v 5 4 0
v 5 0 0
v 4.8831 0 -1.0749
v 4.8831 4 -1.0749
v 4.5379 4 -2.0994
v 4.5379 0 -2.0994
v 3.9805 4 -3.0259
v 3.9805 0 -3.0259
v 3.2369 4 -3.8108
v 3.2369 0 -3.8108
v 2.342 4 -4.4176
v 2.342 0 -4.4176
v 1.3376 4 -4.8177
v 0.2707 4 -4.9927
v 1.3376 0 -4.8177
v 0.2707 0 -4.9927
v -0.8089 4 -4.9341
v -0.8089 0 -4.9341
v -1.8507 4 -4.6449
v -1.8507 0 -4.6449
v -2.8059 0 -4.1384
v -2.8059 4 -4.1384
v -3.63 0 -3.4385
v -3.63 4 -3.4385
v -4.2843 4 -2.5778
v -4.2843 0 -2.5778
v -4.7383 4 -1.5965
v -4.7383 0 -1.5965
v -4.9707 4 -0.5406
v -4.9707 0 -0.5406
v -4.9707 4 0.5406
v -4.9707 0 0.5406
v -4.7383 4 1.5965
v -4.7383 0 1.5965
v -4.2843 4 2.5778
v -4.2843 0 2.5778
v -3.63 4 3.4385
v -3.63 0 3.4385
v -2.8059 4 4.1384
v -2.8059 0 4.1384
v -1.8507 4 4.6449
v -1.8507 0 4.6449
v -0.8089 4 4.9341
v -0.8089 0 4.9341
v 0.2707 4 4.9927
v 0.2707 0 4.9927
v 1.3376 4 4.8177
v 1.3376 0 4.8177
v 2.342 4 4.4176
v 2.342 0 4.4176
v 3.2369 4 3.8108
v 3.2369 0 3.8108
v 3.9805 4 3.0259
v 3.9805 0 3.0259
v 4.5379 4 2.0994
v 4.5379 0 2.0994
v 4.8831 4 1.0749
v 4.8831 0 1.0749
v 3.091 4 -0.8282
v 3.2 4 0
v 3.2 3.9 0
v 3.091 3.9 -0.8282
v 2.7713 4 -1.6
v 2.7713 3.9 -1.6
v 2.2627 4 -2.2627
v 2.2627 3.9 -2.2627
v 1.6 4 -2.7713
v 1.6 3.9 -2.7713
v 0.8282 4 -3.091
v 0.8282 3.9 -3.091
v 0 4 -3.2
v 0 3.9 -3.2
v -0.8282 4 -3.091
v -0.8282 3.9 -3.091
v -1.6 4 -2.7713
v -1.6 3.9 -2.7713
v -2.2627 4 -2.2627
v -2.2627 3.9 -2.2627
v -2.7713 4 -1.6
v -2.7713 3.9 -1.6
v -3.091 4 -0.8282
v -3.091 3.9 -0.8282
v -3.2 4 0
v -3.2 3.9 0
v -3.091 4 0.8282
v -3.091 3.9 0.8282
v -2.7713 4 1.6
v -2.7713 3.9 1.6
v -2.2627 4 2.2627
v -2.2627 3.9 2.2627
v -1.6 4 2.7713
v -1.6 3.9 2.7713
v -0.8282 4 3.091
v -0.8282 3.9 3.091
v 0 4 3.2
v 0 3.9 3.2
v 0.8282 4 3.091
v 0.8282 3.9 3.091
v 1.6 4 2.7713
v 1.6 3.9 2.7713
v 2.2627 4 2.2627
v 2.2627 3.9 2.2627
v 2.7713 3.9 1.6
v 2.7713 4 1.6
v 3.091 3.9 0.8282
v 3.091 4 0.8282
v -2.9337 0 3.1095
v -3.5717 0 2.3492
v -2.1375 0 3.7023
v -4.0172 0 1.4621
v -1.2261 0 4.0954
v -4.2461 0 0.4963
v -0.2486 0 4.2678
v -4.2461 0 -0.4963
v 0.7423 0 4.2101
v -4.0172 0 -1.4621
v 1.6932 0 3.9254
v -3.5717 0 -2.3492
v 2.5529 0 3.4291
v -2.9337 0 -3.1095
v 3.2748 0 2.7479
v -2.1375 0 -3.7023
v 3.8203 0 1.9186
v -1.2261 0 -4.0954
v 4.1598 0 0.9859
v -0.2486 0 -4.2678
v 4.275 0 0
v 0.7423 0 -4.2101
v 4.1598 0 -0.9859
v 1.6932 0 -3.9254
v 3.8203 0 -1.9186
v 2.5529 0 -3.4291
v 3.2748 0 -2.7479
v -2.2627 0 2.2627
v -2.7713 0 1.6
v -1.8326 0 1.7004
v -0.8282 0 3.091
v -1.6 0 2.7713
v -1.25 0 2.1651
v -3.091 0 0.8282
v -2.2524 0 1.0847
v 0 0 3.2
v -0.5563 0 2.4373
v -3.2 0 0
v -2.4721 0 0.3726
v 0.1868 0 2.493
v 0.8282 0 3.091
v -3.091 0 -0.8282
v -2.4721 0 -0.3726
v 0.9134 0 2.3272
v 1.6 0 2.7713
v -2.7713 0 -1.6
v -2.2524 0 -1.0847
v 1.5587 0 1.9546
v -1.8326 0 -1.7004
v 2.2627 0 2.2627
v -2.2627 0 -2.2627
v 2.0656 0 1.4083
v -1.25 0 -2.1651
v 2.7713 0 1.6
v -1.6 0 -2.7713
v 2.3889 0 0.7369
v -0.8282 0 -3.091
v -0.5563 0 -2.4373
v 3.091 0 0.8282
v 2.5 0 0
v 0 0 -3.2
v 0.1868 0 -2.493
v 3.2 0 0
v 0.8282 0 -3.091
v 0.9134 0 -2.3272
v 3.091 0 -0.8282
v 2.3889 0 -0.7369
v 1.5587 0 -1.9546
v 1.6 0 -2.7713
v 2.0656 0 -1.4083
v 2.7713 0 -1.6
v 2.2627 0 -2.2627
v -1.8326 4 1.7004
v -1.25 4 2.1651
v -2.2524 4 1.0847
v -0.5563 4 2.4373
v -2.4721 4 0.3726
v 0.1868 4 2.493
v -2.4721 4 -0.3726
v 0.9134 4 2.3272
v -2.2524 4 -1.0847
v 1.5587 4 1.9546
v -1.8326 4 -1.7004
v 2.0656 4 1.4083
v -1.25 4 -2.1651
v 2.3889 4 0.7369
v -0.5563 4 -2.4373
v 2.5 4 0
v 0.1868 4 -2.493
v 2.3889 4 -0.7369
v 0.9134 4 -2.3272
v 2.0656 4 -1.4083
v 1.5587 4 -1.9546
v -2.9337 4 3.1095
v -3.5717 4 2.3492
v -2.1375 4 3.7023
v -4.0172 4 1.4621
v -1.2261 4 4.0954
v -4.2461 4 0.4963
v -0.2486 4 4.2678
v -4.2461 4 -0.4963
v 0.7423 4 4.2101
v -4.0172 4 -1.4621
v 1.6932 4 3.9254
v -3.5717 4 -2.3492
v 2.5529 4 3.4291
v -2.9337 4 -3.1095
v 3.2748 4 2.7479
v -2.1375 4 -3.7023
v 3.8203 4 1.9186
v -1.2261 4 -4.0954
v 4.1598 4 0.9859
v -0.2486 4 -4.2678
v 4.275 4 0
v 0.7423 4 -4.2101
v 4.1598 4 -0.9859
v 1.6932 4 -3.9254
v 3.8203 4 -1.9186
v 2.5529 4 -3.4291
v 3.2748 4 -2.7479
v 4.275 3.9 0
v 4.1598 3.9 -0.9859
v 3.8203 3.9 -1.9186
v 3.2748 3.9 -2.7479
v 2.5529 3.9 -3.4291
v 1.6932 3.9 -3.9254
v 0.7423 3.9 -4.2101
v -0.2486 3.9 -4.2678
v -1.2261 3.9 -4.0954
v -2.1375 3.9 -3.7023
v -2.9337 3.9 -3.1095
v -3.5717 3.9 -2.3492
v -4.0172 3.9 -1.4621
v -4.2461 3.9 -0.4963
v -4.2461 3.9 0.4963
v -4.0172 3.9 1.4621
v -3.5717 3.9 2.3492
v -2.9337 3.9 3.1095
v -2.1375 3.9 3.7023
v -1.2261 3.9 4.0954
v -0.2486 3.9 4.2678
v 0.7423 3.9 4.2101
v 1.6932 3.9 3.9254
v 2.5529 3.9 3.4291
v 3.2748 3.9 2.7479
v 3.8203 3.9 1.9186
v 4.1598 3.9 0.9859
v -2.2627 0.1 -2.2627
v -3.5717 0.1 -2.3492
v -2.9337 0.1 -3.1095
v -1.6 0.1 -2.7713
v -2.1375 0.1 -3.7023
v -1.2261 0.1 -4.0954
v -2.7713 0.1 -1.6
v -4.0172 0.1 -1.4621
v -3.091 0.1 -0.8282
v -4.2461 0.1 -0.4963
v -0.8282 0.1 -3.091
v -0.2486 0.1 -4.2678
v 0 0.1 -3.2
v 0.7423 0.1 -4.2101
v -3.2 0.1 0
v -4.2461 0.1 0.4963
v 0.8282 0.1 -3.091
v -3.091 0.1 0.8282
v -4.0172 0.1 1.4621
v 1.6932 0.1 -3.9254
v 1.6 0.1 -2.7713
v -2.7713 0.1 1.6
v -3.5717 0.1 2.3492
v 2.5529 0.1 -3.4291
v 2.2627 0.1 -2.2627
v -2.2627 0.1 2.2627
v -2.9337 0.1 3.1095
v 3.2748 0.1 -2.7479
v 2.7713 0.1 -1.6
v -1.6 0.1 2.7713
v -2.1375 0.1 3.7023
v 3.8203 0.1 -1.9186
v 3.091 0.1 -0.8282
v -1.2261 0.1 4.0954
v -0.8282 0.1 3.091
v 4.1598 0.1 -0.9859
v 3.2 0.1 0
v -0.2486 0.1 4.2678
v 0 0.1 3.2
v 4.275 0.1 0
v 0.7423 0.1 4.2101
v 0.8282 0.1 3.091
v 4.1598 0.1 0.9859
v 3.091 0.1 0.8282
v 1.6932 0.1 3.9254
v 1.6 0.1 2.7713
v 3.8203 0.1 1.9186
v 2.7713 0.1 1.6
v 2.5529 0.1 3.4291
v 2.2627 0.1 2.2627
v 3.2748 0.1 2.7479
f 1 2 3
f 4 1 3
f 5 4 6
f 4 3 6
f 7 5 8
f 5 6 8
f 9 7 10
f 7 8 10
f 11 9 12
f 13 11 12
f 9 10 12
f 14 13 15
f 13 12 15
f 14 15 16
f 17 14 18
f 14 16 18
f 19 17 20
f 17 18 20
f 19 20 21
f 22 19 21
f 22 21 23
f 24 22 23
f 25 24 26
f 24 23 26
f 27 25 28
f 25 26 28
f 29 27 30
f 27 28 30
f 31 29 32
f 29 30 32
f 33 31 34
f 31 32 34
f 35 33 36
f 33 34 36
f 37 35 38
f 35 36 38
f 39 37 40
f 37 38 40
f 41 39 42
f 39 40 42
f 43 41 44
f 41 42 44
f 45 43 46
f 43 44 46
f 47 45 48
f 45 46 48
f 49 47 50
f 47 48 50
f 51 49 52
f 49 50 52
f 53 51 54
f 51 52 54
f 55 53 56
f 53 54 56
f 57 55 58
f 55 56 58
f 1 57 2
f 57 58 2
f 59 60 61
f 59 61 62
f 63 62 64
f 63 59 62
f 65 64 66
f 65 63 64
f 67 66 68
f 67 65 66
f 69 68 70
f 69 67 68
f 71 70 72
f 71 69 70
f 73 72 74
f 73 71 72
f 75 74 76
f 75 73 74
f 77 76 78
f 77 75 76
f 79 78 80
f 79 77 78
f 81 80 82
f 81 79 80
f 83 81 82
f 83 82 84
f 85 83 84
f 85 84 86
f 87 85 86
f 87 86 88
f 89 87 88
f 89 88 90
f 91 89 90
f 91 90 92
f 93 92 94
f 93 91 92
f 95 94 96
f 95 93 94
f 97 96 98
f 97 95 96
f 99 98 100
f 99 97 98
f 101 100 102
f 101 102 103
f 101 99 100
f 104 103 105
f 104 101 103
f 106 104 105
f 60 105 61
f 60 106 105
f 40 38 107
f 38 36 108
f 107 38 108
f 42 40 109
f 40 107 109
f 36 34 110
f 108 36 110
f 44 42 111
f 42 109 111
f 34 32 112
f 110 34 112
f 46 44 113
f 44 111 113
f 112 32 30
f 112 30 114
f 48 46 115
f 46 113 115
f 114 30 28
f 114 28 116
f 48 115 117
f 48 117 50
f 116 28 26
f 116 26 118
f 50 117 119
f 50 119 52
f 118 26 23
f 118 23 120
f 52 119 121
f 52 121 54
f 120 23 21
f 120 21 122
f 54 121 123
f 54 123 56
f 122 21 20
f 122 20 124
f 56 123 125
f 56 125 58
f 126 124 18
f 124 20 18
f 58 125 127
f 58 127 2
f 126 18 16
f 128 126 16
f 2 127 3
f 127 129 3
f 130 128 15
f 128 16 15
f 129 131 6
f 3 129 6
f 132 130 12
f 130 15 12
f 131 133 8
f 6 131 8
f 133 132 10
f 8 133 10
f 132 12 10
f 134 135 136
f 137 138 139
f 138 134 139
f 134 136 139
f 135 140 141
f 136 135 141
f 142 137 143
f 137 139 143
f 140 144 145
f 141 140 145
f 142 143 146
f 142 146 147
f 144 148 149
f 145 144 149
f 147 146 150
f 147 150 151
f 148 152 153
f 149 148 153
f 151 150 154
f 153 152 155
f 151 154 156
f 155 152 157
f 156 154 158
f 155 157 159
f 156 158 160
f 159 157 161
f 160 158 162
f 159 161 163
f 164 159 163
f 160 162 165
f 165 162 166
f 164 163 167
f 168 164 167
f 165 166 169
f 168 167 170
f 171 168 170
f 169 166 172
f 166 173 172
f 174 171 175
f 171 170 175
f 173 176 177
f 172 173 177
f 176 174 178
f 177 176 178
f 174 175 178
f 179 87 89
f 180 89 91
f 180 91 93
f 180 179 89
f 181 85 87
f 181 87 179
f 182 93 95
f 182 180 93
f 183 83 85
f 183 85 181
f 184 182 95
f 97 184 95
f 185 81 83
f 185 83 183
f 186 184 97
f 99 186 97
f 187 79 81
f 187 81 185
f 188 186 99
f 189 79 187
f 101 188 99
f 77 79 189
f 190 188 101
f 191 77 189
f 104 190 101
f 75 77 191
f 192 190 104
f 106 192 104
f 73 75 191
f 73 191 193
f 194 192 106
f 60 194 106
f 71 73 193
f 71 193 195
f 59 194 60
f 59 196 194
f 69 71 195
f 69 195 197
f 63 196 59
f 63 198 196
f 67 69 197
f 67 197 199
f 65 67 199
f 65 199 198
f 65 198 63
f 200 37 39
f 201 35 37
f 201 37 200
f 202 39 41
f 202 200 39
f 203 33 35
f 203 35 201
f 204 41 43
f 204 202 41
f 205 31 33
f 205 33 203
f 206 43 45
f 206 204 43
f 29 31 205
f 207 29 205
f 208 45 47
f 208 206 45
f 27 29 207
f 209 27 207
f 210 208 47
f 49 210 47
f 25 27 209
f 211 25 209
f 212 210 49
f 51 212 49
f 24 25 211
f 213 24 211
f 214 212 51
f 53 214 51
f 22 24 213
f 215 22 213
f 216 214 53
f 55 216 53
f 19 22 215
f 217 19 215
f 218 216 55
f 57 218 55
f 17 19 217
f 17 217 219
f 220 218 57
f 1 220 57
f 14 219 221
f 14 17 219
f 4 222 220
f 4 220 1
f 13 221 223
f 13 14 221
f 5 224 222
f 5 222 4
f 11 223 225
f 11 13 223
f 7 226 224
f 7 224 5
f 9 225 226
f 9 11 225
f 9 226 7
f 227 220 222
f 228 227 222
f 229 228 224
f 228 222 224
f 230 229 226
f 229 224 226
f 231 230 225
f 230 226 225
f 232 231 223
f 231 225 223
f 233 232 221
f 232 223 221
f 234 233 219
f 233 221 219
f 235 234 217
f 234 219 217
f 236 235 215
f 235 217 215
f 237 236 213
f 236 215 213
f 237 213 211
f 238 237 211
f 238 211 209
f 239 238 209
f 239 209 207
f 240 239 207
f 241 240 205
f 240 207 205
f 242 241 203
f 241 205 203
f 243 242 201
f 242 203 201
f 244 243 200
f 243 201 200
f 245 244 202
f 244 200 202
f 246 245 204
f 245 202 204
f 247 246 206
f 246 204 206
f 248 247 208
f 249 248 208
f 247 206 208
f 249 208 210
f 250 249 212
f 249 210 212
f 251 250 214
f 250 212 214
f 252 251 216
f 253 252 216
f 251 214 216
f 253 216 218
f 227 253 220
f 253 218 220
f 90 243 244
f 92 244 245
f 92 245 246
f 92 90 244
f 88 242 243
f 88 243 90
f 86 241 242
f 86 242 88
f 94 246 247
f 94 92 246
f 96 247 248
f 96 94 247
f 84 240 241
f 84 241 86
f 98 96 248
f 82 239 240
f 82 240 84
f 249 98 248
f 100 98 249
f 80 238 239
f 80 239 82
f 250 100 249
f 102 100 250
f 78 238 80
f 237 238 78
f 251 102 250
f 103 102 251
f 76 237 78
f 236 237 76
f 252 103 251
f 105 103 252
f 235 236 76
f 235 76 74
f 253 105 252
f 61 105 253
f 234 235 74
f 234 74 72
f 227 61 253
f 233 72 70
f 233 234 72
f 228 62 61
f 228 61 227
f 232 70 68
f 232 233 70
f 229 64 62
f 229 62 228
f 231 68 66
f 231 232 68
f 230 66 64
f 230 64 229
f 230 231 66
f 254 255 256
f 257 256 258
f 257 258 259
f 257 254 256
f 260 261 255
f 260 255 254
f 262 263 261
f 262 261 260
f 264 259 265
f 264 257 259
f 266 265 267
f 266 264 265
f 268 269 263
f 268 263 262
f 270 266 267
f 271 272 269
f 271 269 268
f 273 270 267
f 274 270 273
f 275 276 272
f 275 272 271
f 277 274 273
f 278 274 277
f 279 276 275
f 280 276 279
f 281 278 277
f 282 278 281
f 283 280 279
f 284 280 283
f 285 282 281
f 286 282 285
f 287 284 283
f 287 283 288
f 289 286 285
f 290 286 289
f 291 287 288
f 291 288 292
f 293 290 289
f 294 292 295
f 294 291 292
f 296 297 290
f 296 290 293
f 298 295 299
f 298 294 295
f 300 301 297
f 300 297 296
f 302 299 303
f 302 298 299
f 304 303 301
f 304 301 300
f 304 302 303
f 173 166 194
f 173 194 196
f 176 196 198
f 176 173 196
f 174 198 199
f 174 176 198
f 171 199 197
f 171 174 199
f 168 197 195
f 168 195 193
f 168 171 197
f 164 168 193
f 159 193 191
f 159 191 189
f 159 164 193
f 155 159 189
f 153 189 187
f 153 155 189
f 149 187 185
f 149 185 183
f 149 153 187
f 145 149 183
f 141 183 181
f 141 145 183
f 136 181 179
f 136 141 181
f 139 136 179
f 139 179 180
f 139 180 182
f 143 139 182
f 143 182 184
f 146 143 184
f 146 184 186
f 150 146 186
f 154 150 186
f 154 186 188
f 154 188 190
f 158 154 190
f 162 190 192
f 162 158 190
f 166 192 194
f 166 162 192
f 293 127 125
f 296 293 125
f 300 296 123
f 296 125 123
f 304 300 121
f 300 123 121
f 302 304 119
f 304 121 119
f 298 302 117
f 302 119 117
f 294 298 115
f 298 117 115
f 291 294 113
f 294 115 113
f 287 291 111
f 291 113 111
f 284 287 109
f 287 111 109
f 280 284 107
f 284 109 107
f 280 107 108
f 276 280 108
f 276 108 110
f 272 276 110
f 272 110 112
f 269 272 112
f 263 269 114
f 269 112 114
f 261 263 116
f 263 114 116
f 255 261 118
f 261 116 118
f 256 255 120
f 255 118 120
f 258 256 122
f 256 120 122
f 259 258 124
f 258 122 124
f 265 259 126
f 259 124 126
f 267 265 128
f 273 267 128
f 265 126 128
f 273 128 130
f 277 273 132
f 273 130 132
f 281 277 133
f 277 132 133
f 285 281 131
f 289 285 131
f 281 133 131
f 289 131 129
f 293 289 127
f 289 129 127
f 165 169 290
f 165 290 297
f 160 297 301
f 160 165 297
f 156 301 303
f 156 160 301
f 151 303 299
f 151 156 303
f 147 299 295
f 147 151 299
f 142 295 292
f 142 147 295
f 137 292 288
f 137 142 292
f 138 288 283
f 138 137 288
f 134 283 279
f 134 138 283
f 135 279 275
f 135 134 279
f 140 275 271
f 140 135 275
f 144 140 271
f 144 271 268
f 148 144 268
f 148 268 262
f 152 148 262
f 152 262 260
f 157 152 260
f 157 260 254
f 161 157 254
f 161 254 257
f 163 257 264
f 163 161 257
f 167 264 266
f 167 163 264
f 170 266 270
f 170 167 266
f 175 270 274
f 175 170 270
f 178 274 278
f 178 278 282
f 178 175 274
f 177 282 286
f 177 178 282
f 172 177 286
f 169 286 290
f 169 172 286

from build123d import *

# Parameters (mm, degrees)
SKETCH1_R           = 5
SKETCH1_R_2         = 2.5
BOSS_EXTRUDE1_DEPTH = 4
SKETCH2_R           = 4.275
SKETCH2_R_2         = 3.2
CUT_EXTRUDE1_DEPTH  = 0.1
SKETCH3_R           = 4.275
SKETCH3_R_2         = 3.2
CUT_EXTRUDE2_DEPTH  = 0.1


with BuildPart() as part:
    # Sketch1 → Boss-Extrude1 (new body)
    with BuildSketch(Plane(origin=(0, 0, 0), x_dir=(1, 0, 0), z_dir=(0, 1, 0))):
        Circle(SKETCH1_R)
        Circle(SKETCH1_R_2, mode=Mode.SUBTRACT)
    extrude(amount=BOSS_EXTRUDE1_DEPTH)

    # Sketch2 → Cut-Extrude1 (cut)
    with BuildSketch(Plane(origin=(0, 4, 0), x_dir=(1, 0, 0), z_dir=(0, 1, 0))):
        Circle(SKETCH2_R)
        Circle(SKETCH2_R_2, mode=Mode.SUBTRACT)
    extrude(amount=-CUT_EXTRUDE1_DEPTH, mode=Mode.SUBTRACT)

    # Sketch3 → Cut-Extrude2 (cut)
    with BuildSketch(Plane.XZ):
        Circle(SKETCH3_R)
        Circle(SKETCH3_R_2, mode=Mode.SUBTRACT)
    extrude(amount=-CUT_EXTRUDE2_DEPTH, mode=Mode.SUBTRACT)


solid = part.part
